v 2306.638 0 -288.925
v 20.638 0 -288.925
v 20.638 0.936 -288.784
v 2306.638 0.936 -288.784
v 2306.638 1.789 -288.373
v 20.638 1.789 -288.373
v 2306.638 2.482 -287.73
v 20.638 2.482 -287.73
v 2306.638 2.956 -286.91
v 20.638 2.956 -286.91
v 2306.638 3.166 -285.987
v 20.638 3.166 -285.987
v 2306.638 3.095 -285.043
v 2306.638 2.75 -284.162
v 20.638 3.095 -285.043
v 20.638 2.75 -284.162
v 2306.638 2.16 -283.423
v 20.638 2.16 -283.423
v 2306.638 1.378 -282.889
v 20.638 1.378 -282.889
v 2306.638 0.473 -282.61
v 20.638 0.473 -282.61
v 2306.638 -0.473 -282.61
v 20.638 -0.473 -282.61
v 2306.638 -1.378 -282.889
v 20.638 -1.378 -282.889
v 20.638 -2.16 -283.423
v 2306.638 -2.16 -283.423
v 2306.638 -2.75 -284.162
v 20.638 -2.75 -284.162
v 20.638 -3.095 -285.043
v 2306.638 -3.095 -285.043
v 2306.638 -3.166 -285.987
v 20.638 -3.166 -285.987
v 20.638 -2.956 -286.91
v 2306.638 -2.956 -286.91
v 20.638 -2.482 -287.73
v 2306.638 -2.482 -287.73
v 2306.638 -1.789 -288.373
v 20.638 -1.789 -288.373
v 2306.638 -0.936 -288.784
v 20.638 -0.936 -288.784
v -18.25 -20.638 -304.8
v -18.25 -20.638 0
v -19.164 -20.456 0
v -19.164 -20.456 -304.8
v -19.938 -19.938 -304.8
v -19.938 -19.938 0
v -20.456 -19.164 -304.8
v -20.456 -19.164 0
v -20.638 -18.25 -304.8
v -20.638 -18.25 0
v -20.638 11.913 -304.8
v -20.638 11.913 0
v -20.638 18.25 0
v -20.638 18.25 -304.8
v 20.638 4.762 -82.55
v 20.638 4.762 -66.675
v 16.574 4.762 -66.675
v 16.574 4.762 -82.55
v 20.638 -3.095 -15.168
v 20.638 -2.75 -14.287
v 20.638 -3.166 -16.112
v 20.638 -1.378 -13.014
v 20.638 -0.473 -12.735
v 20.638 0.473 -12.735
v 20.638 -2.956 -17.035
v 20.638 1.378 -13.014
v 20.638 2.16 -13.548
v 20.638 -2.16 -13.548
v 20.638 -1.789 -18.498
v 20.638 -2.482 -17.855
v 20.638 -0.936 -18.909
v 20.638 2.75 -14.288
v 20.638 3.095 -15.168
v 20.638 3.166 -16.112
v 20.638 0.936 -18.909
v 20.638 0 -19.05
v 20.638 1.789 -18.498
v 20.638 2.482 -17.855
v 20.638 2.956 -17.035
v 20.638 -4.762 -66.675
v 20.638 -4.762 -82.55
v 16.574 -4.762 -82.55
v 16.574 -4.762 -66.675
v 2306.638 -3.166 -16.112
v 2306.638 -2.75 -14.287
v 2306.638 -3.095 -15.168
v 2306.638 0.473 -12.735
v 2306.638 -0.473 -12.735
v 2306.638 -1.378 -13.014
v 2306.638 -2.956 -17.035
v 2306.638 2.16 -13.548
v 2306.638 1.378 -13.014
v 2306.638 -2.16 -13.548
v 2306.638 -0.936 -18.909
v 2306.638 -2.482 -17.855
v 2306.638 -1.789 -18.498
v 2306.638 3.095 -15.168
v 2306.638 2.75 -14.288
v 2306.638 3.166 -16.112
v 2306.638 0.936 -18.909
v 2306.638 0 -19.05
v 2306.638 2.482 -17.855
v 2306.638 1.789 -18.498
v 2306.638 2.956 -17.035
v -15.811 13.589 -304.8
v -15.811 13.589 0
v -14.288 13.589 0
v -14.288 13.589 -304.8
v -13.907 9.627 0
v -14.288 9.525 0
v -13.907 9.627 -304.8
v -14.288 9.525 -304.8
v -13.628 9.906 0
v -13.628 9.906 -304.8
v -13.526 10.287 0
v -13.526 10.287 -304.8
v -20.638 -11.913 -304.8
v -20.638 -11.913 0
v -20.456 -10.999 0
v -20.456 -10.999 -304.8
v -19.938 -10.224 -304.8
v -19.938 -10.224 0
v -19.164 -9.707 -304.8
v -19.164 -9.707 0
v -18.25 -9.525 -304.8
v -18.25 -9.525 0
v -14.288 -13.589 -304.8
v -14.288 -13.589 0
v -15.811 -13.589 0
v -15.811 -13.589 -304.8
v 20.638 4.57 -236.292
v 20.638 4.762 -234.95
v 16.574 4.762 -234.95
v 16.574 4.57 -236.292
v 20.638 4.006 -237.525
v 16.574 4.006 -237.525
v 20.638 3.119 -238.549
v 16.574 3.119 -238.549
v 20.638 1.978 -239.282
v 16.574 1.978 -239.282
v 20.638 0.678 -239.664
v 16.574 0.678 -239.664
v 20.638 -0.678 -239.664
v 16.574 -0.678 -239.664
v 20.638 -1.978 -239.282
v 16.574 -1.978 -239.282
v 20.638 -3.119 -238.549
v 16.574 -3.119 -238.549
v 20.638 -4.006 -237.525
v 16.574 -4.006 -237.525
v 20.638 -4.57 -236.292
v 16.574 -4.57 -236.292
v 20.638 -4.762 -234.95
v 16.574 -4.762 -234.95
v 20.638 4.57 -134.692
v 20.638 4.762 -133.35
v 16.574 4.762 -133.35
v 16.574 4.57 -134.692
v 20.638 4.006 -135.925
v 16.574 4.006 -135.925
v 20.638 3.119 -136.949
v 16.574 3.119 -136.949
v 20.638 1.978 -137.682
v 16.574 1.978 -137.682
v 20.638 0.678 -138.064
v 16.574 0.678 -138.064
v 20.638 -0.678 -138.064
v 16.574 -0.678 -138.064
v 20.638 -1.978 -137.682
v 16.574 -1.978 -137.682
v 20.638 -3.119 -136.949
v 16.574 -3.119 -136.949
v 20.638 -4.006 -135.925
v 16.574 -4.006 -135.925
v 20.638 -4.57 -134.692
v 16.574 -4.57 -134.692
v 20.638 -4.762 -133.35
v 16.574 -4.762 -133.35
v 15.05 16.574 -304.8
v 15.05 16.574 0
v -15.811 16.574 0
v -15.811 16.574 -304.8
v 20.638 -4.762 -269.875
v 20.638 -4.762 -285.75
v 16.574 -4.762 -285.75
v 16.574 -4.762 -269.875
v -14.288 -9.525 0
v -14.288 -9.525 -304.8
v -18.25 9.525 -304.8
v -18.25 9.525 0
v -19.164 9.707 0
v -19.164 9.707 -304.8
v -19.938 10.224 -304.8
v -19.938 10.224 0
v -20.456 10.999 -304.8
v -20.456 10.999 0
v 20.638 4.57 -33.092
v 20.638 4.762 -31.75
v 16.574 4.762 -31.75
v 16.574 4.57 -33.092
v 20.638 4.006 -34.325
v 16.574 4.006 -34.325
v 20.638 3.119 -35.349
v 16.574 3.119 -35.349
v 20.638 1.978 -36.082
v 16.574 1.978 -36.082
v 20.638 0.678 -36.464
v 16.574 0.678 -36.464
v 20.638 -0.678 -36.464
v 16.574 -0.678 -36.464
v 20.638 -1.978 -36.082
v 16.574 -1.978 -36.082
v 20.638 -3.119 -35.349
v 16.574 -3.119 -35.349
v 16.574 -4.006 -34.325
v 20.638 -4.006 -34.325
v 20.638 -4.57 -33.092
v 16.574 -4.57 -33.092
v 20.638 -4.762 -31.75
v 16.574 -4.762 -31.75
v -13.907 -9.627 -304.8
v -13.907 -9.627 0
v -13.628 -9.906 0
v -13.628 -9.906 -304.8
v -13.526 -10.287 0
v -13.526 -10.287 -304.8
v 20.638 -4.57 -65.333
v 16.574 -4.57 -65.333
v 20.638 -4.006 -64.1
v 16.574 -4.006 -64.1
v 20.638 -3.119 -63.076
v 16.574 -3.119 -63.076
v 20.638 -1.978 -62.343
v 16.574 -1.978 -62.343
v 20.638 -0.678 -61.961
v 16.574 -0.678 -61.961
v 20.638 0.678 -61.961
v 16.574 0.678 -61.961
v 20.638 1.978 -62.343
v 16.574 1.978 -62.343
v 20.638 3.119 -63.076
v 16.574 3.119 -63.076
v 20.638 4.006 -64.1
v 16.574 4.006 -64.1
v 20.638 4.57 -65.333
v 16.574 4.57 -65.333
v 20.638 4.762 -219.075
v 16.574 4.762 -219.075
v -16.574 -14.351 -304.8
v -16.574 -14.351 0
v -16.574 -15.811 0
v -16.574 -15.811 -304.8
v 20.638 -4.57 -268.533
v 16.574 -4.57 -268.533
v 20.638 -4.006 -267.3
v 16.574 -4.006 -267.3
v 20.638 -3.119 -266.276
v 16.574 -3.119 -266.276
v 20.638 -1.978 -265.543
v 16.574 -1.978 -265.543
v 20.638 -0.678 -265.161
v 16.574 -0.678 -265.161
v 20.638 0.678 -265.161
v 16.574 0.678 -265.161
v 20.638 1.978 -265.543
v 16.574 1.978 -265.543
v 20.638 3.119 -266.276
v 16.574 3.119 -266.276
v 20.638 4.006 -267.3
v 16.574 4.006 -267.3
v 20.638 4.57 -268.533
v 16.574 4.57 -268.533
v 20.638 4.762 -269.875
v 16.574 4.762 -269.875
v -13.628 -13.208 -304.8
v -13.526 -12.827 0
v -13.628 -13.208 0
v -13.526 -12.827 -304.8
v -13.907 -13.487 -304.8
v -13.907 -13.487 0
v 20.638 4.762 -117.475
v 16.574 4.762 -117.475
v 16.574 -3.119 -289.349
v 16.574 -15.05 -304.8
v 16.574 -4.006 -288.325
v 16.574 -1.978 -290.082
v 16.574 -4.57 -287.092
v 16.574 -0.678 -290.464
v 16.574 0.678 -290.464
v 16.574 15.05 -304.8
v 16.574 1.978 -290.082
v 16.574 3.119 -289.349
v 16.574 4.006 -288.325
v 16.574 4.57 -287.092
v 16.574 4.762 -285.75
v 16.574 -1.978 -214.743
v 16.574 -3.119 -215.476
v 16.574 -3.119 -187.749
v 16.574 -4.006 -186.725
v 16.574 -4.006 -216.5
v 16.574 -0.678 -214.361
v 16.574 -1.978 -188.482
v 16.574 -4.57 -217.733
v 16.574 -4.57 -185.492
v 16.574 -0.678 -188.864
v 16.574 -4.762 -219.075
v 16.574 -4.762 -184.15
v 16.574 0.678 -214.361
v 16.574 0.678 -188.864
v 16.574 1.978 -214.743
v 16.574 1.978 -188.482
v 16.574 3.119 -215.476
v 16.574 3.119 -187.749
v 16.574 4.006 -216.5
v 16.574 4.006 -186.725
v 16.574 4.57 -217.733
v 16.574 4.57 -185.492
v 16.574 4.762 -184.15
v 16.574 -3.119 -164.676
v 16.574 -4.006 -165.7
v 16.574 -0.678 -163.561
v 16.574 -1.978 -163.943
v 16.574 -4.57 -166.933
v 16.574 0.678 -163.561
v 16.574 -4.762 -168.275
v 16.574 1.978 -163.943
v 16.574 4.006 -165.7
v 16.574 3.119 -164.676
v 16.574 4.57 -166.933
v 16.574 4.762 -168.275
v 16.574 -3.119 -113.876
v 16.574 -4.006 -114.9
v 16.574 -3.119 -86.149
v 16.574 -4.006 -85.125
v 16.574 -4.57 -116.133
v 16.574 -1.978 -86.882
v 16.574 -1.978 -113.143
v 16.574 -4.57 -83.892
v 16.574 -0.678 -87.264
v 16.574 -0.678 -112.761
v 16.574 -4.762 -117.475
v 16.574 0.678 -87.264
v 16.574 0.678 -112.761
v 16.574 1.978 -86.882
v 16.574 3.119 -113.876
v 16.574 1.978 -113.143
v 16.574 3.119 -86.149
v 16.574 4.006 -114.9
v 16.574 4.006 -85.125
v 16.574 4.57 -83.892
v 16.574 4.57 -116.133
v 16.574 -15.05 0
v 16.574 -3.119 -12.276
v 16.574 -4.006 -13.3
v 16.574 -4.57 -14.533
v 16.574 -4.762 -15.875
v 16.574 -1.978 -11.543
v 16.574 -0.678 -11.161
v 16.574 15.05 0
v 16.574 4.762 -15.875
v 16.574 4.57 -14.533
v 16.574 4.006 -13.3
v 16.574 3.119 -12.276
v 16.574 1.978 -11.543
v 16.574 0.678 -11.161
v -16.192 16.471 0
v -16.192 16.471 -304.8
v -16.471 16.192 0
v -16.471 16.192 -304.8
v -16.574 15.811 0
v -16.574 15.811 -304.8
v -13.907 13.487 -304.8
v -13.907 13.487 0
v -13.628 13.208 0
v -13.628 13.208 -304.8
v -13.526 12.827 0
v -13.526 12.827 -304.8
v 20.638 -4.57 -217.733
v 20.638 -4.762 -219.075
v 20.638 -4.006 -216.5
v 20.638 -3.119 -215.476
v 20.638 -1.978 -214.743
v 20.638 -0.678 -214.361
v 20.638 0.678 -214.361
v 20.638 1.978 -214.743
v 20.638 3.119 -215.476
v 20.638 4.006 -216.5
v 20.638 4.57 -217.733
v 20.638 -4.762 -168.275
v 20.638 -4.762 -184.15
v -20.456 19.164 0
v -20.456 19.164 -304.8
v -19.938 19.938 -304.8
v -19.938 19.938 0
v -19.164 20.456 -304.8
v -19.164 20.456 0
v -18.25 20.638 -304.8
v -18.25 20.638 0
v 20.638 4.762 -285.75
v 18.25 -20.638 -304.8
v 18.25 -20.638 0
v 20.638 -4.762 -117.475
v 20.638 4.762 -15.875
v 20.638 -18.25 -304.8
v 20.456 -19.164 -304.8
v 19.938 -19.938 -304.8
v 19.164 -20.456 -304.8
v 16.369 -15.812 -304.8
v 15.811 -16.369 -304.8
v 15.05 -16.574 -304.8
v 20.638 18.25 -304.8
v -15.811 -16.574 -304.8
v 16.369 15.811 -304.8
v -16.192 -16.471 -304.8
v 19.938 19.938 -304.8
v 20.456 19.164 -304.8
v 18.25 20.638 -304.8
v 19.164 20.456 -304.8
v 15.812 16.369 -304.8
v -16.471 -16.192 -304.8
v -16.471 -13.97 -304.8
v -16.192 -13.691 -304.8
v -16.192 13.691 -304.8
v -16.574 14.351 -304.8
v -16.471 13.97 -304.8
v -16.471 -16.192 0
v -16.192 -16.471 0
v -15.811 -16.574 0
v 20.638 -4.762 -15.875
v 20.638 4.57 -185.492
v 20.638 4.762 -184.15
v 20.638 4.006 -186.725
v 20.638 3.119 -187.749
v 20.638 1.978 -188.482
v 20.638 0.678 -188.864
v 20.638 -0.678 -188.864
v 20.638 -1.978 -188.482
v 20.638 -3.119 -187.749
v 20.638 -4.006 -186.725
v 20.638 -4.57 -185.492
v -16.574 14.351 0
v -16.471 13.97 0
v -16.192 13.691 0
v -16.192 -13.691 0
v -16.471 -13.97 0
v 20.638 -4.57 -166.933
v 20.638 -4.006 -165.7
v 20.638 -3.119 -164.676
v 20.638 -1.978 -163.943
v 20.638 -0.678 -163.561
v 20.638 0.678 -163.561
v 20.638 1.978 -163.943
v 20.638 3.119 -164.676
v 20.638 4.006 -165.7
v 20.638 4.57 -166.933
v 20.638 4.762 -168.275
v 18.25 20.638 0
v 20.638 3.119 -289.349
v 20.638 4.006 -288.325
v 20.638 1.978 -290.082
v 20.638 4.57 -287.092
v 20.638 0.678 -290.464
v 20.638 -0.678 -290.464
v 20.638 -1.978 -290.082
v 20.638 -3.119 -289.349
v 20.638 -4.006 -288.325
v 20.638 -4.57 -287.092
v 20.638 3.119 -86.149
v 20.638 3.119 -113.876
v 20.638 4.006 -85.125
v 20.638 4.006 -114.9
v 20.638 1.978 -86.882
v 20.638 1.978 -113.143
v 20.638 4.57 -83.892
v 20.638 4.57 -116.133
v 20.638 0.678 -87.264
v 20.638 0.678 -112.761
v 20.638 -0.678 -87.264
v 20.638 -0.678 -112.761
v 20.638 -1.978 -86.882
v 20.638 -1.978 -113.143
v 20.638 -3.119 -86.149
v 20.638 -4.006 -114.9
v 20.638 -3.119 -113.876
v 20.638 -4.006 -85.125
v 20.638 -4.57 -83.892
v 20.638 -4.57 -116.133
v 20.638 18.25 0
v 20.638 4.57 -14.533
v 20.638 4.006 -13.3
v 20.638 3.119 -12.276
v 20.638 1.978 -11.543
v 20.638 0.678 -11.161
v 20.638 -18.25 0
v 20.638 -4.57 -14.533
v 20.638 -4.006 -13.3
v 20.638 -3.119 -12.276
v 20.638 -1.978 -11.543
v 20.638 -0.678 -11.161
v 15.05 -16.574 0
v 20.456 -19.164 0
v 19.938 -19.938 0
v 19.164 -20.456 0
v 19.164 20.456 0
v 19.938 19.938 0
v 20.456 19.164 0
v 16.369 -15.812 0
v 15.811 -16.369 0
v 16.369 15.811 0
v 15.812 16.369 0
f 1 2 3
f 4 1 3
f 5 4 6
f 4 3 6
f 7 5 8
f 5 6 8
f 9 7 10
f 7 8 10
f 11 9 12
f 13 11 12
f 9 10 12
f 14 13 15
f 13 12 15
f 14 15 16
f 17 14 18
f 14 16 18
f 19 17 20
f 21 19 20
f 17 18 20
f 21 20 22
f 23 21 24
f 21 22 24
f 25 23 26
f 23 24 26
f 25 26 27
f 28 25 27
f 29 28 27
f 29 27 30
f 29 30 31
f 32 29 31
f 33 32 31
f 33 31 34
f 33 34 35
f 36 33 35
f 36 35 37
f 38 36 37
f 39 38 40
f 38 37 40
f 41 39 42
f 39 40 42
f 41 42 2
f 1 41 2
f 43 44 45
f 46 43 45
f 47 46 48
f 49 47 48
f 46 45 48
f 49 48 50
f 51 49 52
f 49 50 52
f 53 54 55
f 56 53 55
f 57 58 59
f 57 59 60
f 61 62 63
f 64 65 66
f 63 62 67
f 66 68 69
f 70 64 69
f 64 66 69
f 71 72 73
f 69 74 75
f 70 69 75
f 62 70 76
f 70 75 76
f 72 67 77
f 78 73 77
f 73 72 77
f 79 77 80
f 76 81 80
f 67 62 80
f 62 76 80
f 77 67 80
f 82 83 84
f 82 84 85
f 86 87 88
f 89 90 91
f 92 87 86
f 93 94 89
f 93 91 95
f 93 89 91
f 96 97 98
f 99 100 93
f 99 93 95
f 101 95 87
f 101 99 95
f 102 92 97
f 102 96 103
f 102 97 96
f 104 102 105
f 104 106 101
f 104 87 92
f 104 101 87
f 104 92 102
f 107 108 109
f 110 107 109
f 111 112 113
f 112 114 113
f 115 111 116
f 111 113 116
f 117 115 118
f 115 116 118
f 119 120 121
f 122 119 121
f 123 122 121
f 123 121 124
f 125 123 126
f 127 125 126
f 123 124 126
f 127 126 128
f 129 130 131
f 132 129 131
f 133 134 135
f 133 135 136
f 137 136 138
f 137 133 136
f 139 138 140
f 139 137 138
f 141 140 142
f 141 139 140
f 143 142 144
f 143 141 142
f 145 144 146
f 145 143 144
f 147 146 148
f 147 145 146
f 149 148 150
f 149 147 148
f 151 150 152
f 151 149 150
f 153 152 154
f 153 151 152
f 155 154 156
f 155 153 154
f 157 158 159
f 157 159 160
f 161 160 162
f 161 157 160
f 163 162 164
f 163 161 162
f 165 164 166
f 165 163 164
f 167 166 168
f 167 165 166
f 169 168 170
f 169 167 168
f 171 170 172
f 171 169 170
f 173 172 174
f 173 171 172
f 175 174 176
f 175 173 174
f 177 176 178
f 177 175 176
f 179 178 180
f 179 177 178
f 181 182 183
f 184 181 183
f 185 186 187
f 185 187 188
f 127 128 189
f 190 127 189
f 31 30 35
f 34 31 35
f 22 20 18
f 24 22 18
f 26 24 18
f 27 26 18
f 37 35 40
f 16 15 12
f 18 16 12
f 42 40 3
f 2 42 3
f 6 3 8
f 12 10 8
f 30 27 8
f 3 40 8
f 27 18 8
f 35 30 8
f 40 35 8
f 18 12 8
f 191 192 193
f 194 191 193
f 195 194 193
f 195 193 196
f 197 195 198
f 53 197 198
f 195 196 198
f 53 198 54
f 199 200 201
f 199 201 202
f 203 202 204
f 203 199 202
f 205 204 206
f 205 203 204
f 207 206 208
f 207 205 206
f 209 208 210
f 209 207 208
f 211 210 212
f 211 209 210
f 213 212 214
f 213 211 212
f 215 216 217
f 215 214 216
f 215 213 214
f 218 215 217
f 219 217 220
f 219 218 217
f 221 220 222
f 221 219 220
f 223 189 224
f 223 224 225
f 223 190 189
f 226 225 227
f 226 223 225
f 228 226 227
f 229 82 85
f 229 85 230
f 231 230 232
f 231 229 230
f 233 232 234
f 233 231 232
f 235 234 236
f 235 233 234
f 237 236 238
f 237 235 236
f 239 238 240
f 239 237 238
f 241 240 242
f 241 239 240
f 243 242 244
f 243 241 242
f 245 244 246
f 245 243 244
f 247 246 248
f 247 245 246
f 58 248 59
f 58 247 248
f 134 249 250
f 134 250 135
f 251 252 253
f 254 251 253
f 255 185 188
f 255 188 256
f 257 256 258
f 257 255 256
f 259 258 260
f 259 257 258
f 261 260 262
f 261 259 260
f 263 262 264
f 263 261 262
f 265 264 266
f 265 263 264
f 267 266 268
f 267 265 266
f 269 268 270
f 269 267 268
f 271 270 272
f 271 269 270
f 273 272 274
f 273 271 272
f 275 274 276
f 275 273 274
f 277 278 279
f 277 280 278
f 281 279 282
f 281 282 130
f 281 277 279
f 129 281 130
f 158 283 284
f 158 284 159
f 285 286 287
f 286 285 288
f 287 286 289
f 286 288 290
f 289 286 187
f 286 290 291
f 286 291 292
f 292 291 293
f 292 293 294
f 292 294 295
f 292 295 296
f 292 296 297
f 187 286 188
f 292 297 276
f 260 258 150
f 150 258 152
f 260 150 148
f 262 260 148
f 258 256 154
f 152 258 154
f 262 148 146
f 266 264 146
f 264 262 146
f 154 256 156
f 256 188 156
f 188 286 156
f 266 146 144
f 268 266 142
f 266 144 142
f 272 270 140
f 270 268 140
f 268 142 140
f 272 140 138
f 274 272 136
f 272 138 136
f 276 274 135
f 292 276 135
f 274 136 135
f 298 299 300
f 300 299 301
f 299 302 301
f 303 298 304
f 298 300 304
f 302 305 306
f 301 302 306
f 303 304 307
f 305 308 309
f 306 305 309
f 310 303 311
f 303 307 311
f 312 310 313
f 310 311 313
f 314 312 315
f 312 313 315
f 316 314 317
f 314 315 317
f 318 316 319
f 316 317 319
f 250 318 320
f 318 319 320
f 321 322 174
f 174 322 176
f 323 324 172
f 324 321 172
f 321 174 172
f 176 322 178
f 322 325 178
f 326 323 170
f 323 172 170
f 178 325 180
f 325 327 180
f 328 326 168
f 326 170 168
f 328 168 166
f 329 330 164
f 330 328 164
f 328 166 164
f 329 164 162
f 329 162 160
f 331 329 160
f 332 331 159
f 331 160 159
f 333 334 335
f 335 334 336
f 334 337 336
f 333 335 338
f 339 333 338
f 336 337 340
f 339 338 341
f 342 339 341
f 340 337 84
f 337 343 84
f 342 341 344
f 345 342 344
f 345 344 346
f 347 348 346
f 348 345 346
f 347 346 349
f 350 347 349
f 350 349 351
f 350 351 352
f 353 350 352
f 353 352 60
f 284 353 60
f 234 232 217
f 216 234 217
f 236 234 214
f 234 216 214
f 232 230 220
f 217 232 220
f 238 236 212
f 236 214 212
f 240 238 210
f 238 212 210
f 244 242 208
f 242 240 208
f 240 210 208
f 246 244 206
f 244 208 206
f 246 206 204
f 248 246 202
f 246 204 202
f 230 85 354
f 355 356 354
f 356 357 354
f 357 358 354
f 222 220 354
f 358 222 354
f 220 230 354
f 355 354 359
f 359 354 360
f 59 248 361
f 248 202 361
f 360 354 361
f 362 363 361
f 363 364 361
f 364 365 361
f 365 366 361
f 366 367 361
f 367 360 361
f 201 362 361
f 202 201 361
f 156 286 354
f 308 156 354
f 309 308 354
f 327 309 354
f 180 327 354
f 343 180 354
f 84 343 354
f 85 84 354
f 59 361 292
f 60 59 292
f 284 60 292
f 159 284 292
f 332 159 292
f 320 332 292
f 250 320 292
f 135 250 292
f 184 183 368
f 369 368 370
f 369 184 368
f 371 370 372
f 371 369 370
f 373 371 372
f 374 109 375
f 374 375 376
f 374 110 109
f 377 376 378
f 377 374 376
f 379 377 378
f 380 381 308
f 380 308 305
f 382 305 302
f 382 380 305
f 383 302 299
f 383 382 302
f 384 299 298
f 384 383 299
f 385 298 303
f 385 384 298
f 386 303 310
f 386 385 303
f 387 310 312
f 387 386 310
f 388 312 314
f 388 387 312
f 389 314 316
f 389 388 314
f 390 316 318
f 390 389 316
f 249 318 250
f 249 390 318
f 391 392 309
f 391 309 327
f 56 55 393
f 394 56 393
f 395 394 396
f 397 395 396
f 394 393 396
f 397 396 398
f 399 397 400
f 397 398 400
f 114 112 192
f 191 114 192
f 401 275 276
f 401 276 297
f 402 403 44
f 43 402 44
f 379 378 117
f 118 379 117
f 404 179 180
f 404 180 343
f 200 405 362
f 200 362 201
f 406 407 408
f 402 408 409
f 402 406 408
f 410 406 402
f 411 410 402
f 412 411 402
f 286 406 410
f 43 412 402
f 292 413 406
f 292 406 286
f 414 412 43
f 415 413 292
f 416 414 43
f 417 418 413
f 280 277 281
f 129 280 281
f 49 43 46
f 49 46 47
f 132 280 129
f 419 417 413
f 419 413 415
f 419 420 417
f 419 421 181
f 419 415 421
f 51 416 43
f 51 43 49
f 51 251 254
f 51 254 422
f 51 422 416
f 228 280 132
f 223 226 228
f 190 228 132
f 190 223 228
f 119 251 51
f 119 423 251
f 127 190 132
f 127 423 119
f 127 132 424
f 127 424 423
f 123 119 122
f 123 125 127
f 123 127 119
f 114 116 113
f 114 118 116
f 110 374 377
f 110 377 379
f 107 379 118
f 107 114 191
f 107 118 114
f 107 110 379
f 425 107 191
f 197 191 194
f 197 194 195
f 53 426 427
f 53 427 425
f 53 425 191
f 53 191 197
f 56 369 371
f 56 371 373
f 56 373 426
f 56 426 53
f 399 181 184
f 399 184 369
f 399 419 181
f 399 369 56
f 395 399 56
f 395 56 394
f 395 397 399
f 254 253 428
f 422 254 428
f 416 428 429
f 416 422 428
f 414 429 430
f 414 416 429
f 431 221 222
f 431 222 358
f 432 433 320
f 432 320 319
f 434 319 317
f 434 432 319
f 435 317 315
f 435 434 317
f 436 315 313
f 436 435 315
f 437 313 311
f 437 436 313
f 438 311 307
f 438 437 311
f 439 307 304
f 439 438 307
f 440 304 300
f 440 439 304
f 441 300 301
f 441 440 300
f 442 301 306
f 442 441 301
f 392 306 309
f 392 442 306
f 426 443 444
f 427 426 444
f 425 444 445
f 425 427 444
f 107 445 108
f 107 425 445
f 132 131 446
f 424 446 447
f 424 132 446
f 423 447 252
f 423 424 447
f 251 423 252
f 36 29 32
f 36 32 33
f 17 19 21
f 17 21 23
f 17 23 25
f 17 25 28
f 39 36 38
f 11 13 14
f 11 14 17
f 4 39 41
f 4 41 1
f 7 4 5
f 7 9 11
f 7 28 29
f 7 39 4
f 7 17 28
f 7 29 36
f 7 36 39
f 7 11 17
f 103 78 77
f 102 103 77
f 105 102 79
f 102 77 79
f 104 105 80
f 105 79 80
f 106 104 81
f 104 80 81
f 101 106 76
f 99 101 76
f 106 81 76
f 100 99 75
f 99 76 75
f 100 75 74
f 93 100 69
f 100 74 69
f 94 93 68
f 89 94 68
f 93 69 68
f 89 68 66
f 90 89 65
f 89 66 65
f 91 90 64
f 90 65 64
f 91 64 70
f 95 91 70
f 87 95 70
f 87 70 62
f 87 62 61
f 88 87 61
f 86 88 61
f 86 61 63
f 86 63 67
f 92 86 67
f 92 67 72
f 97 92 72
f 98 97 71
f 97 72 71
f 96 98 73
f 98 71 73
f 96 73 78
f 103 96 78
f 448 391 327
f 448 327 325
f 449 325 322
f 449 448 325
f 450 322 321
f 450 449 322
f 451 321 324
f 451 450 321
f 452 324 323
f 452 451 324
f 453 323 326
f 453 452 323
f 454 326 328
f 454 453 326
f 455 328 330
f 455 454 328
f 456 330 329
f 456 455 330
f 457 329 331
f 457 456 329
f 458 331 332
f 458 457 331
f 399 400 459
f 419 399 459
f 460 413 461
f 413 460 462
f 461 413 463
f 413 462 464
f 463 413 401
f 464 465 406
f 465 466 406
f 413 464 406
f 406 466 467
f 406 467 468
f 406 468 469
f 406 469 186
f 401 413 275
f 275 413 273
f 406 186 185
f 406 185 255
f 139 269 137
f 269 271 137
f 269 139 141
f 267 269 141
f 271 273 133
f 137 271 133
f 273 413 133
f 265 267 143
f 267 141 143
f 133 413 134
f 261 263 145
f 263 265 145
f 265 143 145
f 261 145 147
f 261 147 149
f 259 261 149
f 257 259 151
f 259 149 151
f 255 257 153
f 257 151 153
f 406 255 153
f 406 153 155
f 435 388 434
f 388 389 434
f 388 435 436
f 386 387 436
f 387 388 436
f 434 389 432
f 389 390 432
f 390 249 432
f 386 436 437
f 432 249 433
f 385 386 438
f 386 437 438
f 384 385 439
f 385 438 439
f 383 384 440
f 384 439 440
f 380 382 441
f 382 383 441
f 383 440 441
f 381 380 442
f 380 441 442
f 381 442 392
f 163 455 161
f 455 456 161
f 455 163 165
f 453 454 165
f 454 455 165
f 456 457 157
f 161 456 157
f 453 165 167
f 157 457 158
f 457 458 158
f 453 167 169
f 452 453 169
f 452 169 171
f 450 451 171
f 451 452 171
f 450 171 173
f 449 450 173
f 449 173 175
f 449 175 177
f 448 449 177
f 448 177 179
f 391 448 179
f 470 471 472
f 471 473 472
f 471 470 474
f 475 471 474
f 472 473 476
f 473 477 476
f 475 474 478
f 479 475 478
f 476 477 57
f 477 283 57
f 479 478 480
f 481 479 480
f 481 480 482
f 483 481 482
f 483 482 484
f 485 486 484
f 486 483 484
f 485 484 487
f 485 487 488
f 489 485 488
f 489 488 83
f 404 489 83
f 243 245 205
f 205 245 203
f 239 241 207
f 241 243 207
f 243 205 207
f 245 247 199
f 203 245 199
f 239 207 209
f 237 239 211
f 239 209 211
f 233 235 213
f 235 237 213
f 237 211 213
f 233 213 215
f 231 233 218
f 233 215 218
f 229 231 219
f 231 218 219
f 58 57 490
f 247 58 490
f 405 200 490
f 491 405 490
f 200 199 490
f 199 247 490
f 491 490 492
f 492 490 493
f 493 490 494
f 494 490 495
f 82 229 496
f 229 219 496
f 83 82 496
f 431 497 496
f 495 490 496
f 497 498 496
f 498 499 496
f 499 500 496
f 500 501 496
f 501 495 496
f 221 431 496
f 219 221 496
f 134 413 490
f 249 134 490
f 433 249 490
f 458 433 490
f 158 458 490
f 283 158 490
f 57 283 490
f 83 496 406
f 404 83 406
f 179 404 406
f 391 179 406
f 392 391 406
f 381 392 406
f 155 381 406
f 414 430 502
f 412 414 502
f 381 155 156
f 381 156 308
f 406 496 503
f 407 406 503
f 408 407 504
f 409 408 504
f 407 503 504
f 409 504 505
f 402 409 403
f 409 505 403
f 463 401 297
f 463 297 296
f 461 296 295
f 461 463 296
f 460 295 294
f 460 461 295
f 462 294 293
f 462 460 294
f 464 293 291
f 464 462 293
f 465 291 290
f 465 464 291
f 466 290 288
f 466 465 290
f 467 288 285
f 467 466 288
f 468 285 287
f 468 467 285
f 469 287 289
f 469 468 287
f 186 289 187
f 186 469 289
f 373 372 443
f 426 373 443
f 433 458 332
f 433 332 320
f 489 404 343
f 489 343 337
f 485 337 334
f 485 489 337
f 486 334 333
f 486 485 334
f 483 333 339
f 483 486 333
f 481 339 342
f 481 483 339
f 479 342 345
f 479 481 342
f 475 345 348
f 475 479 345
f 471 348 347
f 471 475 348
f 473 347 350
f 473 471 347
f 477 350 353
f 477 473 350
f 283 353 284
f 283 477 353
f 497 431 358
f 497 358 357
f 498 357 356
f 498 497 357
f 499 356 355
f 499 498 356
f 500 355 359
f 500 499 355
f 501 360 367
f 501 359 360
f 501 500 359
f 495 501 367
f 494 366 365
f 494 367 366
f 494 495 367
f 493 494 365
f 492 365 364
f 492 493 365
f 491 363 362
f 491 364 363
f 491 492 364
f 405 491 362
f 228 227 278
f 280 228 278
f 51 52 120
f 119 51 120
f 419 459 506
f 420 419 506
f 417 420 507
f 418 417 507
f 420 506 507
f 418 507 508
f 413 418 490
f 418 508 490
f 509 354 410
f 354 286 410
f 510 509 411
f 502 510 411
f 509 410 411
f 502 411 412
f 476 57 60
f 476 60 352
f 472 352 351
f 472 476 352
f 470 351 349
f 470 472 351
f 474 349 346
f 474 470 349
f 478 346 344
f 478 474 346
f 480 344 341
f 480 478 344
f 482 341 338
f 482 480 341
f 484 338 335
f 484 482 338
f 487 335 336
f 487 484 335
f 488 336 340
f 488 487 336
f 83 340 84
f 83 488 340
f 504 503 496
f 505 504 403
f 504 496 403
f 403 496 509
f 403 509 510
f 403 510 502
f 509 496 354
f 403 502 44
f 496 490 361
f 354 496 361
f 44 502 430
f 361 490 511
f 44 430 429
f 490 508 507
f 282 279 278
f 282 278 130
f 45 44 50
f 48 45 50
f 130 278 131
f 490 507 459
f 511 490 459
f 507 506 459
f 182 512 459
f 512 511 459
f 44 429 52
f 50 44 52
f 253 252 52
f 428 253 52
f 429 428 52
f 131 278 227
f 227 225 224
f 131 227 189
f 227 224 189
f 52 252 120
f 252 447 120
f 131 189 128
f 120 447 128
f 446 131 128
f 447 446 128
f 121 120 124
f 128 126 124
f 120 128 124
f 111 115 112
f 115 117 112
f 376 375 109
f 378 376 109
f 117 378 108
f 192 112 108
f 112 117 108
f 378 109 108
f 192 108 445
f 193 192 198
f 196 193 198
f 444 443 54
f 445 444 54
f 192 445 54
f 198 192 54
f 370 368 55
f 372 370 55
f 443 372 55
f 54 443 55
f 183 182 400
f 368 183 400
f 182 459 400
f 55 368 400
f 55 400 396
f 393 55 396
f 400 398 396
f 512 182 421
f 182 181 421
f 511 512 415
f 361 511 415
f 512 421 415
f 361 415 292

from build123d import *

# Parameters (mm, degrees)
EXTRUDE_THIN1_DEPTH   = 304.8
FILLET2_R             = 0.762
FILLET3_R             = 1.524
CUT_EXTRUDE1_DEPTH    = 309.273534432
LPATTERN1_COUNT       = 6
LPATTERN1_PITCH       = 50.8
SKETCH4_R             = 3.175
BOSS_EXTRUDE1_DEPTH   = 2286
BOSS_EXTRUDE1_2_DEPTH = 2286


with BuildPart() as part:
    # Sketch1 → Extrude-Thin1 (new body)
    with BuildSketch(Plane.XY):
        with BuildLine():
            Line((-13.5255, 9.525), (-18.2499, 9.525))
            ThreePointArc((-18.2499, 9.525), (-19.938188151, 10.224311849), (-20.6375, 11.9126))
            Line((-20.6375, 11.9126), (-20.6375, 18.2499))
            ThreePointArc((-20.6375, 18.2499), (-19.938188151, 19.938188151), (-18.2499, 20.6375))
            Line((-18.2499, 20.6375), (18.2499, 20.6375))
            ThreePointArc((18.2499, 20.6375), (19.938188151, 19.938188151), (20.6375, 18.2499))
            Line((20.6375, 18.2499), (20.6375, -18.2499))
            ThreePointArc((20.6375, -18.2499), (19.938188151, -19.938188151), (18.2499, -20.6375))
            Line((18.2499, -20.6375), (-18.2499, -20.6375))
            ThreePointArc((-18.2499, -20.6375), (-19.938188151, -19.938188151), (-20.6375, -18.2499))
            Line((-20.6375, -18.2499), (-20.6375, -11.9126))
            ThreePointArc((-20.6375, -11.9126), (-19.938188151, -10.224311849), (-18.2499, -9.525))
            Line((-18.2499, -9.525), (-13.5255, -9.525))
            Line((-13.5255, -9.525), (-13.5255, -13.589))
            Line((-13.5255, -13.589), (-16.5735, -13.589))
            Line((-16.5735, -13.589), (-16.5735, -16.5735))
            Line((-16.5735, -16.5735), (16.5735, -16.5735))
            Line((16.5735, -16.5735), (16.5735, 16.5735))
            Line((16.5735, 16.5735), (-16.5735, 16.5735))
            Line((-16.5735, 16.5735), (-16.5735, 13.589))
            Line((-16.5735, 13.589), (-13.5255, 13.589))
            Line((-13.5255, 13.589), (-13.5255, 9.525))
        make_face()
    extrude(amount=-EXTRUDE_THIN1_DEPTH)

    # Fillet2
    fillet2_edges = [part.edges().sort_by_distance(p)[0] for p in [
        (-16.5735, -13.589, -152.4),
        (-16.5735, -16.5735, -152.4),
        (-16.5735, 16.5735, -152.4),
        (-16.5735, 13.589, -152.4),
        (-13.5255, 13.589, -152.4),
        (-13.5255, 9.525, -152.4),
        (-13.5255, -9.525, -152.4),
        (-13.5255, -13.589, -152.4),
    ]]
    fillet(fillet2_edges, radius=FILLET2_R)

    # Fillet3
    fillet3_edges = [part.edges().sort_by_distance(p)[0] for p in [
        (16.5735, -16.5735, -152.4),
        (16.5735, 16.5735, -152.4),
    ]]
    fillet(fillet3_edges, radius=FILLET3_R)

    # Sketch2 → Cut-Extrude1 (cut, through all)
    with BuildSketch(Plane(origin=(20.6375, 0, 0), x_dir=(0, 0, -1), z_dir=(1, 0, 0))):
        with BuildLine():
            Line((15.875, 4.7625), (31.75, 4.7625))
            ThreePointArc((31.75, 4.7625), (36.5125, 0), (31.75, -4.7625))
            Line((31.75, -4.7625), (15.875, -4.7625))
            ThreePointArc((15.875, -4.7625), (11.1125, 0), (15.875, 4.7625))
        make_face()
    cut_extrude1 = extrude(amount=-CUT_EXTRUDE1_DEPTH, mode=Mode.SUBTRACT)

    # LPattern1: Cut-Extrude1 ×6
    with Locations(*[(0, 0, -i * LPATTERN1_PITCH) for i in range(1, LPATTERN1_COUNT)]):
        add(cut_extrude1, mode=Mode.SUBTRACT)


with BuildPart() as body_2:
    # Sketch4 → Boss-Extrude1 (new body)
    with BuildSketch(Plane(origin=(20.6375, 0, 0), x_dir=(0, 0, -1), z_dir=(1, 0, 0))):
        with Locations((15.875, 0)):
            Circle(SKETCH4_R)
    extrude(amount=BOSS_EXTRUDE1_DEPTH)


with BuildPart() as body_3:
    # Sketch4 → Boss-Extrude1 2 (new body)
    with BuildSketch(Plane(origin=(20.6375, 0, 0), x_dir=(0, 0, -1), z_dir=(1, 0, 0))):
        with Locations((285.75, 0)):
            Circle(SKETCH4_R)
    extrude(amount=BOSS_EXTRUDE1_2_DEPTH)


solid = Compound([part.part, body_2.part, body_3.part])
